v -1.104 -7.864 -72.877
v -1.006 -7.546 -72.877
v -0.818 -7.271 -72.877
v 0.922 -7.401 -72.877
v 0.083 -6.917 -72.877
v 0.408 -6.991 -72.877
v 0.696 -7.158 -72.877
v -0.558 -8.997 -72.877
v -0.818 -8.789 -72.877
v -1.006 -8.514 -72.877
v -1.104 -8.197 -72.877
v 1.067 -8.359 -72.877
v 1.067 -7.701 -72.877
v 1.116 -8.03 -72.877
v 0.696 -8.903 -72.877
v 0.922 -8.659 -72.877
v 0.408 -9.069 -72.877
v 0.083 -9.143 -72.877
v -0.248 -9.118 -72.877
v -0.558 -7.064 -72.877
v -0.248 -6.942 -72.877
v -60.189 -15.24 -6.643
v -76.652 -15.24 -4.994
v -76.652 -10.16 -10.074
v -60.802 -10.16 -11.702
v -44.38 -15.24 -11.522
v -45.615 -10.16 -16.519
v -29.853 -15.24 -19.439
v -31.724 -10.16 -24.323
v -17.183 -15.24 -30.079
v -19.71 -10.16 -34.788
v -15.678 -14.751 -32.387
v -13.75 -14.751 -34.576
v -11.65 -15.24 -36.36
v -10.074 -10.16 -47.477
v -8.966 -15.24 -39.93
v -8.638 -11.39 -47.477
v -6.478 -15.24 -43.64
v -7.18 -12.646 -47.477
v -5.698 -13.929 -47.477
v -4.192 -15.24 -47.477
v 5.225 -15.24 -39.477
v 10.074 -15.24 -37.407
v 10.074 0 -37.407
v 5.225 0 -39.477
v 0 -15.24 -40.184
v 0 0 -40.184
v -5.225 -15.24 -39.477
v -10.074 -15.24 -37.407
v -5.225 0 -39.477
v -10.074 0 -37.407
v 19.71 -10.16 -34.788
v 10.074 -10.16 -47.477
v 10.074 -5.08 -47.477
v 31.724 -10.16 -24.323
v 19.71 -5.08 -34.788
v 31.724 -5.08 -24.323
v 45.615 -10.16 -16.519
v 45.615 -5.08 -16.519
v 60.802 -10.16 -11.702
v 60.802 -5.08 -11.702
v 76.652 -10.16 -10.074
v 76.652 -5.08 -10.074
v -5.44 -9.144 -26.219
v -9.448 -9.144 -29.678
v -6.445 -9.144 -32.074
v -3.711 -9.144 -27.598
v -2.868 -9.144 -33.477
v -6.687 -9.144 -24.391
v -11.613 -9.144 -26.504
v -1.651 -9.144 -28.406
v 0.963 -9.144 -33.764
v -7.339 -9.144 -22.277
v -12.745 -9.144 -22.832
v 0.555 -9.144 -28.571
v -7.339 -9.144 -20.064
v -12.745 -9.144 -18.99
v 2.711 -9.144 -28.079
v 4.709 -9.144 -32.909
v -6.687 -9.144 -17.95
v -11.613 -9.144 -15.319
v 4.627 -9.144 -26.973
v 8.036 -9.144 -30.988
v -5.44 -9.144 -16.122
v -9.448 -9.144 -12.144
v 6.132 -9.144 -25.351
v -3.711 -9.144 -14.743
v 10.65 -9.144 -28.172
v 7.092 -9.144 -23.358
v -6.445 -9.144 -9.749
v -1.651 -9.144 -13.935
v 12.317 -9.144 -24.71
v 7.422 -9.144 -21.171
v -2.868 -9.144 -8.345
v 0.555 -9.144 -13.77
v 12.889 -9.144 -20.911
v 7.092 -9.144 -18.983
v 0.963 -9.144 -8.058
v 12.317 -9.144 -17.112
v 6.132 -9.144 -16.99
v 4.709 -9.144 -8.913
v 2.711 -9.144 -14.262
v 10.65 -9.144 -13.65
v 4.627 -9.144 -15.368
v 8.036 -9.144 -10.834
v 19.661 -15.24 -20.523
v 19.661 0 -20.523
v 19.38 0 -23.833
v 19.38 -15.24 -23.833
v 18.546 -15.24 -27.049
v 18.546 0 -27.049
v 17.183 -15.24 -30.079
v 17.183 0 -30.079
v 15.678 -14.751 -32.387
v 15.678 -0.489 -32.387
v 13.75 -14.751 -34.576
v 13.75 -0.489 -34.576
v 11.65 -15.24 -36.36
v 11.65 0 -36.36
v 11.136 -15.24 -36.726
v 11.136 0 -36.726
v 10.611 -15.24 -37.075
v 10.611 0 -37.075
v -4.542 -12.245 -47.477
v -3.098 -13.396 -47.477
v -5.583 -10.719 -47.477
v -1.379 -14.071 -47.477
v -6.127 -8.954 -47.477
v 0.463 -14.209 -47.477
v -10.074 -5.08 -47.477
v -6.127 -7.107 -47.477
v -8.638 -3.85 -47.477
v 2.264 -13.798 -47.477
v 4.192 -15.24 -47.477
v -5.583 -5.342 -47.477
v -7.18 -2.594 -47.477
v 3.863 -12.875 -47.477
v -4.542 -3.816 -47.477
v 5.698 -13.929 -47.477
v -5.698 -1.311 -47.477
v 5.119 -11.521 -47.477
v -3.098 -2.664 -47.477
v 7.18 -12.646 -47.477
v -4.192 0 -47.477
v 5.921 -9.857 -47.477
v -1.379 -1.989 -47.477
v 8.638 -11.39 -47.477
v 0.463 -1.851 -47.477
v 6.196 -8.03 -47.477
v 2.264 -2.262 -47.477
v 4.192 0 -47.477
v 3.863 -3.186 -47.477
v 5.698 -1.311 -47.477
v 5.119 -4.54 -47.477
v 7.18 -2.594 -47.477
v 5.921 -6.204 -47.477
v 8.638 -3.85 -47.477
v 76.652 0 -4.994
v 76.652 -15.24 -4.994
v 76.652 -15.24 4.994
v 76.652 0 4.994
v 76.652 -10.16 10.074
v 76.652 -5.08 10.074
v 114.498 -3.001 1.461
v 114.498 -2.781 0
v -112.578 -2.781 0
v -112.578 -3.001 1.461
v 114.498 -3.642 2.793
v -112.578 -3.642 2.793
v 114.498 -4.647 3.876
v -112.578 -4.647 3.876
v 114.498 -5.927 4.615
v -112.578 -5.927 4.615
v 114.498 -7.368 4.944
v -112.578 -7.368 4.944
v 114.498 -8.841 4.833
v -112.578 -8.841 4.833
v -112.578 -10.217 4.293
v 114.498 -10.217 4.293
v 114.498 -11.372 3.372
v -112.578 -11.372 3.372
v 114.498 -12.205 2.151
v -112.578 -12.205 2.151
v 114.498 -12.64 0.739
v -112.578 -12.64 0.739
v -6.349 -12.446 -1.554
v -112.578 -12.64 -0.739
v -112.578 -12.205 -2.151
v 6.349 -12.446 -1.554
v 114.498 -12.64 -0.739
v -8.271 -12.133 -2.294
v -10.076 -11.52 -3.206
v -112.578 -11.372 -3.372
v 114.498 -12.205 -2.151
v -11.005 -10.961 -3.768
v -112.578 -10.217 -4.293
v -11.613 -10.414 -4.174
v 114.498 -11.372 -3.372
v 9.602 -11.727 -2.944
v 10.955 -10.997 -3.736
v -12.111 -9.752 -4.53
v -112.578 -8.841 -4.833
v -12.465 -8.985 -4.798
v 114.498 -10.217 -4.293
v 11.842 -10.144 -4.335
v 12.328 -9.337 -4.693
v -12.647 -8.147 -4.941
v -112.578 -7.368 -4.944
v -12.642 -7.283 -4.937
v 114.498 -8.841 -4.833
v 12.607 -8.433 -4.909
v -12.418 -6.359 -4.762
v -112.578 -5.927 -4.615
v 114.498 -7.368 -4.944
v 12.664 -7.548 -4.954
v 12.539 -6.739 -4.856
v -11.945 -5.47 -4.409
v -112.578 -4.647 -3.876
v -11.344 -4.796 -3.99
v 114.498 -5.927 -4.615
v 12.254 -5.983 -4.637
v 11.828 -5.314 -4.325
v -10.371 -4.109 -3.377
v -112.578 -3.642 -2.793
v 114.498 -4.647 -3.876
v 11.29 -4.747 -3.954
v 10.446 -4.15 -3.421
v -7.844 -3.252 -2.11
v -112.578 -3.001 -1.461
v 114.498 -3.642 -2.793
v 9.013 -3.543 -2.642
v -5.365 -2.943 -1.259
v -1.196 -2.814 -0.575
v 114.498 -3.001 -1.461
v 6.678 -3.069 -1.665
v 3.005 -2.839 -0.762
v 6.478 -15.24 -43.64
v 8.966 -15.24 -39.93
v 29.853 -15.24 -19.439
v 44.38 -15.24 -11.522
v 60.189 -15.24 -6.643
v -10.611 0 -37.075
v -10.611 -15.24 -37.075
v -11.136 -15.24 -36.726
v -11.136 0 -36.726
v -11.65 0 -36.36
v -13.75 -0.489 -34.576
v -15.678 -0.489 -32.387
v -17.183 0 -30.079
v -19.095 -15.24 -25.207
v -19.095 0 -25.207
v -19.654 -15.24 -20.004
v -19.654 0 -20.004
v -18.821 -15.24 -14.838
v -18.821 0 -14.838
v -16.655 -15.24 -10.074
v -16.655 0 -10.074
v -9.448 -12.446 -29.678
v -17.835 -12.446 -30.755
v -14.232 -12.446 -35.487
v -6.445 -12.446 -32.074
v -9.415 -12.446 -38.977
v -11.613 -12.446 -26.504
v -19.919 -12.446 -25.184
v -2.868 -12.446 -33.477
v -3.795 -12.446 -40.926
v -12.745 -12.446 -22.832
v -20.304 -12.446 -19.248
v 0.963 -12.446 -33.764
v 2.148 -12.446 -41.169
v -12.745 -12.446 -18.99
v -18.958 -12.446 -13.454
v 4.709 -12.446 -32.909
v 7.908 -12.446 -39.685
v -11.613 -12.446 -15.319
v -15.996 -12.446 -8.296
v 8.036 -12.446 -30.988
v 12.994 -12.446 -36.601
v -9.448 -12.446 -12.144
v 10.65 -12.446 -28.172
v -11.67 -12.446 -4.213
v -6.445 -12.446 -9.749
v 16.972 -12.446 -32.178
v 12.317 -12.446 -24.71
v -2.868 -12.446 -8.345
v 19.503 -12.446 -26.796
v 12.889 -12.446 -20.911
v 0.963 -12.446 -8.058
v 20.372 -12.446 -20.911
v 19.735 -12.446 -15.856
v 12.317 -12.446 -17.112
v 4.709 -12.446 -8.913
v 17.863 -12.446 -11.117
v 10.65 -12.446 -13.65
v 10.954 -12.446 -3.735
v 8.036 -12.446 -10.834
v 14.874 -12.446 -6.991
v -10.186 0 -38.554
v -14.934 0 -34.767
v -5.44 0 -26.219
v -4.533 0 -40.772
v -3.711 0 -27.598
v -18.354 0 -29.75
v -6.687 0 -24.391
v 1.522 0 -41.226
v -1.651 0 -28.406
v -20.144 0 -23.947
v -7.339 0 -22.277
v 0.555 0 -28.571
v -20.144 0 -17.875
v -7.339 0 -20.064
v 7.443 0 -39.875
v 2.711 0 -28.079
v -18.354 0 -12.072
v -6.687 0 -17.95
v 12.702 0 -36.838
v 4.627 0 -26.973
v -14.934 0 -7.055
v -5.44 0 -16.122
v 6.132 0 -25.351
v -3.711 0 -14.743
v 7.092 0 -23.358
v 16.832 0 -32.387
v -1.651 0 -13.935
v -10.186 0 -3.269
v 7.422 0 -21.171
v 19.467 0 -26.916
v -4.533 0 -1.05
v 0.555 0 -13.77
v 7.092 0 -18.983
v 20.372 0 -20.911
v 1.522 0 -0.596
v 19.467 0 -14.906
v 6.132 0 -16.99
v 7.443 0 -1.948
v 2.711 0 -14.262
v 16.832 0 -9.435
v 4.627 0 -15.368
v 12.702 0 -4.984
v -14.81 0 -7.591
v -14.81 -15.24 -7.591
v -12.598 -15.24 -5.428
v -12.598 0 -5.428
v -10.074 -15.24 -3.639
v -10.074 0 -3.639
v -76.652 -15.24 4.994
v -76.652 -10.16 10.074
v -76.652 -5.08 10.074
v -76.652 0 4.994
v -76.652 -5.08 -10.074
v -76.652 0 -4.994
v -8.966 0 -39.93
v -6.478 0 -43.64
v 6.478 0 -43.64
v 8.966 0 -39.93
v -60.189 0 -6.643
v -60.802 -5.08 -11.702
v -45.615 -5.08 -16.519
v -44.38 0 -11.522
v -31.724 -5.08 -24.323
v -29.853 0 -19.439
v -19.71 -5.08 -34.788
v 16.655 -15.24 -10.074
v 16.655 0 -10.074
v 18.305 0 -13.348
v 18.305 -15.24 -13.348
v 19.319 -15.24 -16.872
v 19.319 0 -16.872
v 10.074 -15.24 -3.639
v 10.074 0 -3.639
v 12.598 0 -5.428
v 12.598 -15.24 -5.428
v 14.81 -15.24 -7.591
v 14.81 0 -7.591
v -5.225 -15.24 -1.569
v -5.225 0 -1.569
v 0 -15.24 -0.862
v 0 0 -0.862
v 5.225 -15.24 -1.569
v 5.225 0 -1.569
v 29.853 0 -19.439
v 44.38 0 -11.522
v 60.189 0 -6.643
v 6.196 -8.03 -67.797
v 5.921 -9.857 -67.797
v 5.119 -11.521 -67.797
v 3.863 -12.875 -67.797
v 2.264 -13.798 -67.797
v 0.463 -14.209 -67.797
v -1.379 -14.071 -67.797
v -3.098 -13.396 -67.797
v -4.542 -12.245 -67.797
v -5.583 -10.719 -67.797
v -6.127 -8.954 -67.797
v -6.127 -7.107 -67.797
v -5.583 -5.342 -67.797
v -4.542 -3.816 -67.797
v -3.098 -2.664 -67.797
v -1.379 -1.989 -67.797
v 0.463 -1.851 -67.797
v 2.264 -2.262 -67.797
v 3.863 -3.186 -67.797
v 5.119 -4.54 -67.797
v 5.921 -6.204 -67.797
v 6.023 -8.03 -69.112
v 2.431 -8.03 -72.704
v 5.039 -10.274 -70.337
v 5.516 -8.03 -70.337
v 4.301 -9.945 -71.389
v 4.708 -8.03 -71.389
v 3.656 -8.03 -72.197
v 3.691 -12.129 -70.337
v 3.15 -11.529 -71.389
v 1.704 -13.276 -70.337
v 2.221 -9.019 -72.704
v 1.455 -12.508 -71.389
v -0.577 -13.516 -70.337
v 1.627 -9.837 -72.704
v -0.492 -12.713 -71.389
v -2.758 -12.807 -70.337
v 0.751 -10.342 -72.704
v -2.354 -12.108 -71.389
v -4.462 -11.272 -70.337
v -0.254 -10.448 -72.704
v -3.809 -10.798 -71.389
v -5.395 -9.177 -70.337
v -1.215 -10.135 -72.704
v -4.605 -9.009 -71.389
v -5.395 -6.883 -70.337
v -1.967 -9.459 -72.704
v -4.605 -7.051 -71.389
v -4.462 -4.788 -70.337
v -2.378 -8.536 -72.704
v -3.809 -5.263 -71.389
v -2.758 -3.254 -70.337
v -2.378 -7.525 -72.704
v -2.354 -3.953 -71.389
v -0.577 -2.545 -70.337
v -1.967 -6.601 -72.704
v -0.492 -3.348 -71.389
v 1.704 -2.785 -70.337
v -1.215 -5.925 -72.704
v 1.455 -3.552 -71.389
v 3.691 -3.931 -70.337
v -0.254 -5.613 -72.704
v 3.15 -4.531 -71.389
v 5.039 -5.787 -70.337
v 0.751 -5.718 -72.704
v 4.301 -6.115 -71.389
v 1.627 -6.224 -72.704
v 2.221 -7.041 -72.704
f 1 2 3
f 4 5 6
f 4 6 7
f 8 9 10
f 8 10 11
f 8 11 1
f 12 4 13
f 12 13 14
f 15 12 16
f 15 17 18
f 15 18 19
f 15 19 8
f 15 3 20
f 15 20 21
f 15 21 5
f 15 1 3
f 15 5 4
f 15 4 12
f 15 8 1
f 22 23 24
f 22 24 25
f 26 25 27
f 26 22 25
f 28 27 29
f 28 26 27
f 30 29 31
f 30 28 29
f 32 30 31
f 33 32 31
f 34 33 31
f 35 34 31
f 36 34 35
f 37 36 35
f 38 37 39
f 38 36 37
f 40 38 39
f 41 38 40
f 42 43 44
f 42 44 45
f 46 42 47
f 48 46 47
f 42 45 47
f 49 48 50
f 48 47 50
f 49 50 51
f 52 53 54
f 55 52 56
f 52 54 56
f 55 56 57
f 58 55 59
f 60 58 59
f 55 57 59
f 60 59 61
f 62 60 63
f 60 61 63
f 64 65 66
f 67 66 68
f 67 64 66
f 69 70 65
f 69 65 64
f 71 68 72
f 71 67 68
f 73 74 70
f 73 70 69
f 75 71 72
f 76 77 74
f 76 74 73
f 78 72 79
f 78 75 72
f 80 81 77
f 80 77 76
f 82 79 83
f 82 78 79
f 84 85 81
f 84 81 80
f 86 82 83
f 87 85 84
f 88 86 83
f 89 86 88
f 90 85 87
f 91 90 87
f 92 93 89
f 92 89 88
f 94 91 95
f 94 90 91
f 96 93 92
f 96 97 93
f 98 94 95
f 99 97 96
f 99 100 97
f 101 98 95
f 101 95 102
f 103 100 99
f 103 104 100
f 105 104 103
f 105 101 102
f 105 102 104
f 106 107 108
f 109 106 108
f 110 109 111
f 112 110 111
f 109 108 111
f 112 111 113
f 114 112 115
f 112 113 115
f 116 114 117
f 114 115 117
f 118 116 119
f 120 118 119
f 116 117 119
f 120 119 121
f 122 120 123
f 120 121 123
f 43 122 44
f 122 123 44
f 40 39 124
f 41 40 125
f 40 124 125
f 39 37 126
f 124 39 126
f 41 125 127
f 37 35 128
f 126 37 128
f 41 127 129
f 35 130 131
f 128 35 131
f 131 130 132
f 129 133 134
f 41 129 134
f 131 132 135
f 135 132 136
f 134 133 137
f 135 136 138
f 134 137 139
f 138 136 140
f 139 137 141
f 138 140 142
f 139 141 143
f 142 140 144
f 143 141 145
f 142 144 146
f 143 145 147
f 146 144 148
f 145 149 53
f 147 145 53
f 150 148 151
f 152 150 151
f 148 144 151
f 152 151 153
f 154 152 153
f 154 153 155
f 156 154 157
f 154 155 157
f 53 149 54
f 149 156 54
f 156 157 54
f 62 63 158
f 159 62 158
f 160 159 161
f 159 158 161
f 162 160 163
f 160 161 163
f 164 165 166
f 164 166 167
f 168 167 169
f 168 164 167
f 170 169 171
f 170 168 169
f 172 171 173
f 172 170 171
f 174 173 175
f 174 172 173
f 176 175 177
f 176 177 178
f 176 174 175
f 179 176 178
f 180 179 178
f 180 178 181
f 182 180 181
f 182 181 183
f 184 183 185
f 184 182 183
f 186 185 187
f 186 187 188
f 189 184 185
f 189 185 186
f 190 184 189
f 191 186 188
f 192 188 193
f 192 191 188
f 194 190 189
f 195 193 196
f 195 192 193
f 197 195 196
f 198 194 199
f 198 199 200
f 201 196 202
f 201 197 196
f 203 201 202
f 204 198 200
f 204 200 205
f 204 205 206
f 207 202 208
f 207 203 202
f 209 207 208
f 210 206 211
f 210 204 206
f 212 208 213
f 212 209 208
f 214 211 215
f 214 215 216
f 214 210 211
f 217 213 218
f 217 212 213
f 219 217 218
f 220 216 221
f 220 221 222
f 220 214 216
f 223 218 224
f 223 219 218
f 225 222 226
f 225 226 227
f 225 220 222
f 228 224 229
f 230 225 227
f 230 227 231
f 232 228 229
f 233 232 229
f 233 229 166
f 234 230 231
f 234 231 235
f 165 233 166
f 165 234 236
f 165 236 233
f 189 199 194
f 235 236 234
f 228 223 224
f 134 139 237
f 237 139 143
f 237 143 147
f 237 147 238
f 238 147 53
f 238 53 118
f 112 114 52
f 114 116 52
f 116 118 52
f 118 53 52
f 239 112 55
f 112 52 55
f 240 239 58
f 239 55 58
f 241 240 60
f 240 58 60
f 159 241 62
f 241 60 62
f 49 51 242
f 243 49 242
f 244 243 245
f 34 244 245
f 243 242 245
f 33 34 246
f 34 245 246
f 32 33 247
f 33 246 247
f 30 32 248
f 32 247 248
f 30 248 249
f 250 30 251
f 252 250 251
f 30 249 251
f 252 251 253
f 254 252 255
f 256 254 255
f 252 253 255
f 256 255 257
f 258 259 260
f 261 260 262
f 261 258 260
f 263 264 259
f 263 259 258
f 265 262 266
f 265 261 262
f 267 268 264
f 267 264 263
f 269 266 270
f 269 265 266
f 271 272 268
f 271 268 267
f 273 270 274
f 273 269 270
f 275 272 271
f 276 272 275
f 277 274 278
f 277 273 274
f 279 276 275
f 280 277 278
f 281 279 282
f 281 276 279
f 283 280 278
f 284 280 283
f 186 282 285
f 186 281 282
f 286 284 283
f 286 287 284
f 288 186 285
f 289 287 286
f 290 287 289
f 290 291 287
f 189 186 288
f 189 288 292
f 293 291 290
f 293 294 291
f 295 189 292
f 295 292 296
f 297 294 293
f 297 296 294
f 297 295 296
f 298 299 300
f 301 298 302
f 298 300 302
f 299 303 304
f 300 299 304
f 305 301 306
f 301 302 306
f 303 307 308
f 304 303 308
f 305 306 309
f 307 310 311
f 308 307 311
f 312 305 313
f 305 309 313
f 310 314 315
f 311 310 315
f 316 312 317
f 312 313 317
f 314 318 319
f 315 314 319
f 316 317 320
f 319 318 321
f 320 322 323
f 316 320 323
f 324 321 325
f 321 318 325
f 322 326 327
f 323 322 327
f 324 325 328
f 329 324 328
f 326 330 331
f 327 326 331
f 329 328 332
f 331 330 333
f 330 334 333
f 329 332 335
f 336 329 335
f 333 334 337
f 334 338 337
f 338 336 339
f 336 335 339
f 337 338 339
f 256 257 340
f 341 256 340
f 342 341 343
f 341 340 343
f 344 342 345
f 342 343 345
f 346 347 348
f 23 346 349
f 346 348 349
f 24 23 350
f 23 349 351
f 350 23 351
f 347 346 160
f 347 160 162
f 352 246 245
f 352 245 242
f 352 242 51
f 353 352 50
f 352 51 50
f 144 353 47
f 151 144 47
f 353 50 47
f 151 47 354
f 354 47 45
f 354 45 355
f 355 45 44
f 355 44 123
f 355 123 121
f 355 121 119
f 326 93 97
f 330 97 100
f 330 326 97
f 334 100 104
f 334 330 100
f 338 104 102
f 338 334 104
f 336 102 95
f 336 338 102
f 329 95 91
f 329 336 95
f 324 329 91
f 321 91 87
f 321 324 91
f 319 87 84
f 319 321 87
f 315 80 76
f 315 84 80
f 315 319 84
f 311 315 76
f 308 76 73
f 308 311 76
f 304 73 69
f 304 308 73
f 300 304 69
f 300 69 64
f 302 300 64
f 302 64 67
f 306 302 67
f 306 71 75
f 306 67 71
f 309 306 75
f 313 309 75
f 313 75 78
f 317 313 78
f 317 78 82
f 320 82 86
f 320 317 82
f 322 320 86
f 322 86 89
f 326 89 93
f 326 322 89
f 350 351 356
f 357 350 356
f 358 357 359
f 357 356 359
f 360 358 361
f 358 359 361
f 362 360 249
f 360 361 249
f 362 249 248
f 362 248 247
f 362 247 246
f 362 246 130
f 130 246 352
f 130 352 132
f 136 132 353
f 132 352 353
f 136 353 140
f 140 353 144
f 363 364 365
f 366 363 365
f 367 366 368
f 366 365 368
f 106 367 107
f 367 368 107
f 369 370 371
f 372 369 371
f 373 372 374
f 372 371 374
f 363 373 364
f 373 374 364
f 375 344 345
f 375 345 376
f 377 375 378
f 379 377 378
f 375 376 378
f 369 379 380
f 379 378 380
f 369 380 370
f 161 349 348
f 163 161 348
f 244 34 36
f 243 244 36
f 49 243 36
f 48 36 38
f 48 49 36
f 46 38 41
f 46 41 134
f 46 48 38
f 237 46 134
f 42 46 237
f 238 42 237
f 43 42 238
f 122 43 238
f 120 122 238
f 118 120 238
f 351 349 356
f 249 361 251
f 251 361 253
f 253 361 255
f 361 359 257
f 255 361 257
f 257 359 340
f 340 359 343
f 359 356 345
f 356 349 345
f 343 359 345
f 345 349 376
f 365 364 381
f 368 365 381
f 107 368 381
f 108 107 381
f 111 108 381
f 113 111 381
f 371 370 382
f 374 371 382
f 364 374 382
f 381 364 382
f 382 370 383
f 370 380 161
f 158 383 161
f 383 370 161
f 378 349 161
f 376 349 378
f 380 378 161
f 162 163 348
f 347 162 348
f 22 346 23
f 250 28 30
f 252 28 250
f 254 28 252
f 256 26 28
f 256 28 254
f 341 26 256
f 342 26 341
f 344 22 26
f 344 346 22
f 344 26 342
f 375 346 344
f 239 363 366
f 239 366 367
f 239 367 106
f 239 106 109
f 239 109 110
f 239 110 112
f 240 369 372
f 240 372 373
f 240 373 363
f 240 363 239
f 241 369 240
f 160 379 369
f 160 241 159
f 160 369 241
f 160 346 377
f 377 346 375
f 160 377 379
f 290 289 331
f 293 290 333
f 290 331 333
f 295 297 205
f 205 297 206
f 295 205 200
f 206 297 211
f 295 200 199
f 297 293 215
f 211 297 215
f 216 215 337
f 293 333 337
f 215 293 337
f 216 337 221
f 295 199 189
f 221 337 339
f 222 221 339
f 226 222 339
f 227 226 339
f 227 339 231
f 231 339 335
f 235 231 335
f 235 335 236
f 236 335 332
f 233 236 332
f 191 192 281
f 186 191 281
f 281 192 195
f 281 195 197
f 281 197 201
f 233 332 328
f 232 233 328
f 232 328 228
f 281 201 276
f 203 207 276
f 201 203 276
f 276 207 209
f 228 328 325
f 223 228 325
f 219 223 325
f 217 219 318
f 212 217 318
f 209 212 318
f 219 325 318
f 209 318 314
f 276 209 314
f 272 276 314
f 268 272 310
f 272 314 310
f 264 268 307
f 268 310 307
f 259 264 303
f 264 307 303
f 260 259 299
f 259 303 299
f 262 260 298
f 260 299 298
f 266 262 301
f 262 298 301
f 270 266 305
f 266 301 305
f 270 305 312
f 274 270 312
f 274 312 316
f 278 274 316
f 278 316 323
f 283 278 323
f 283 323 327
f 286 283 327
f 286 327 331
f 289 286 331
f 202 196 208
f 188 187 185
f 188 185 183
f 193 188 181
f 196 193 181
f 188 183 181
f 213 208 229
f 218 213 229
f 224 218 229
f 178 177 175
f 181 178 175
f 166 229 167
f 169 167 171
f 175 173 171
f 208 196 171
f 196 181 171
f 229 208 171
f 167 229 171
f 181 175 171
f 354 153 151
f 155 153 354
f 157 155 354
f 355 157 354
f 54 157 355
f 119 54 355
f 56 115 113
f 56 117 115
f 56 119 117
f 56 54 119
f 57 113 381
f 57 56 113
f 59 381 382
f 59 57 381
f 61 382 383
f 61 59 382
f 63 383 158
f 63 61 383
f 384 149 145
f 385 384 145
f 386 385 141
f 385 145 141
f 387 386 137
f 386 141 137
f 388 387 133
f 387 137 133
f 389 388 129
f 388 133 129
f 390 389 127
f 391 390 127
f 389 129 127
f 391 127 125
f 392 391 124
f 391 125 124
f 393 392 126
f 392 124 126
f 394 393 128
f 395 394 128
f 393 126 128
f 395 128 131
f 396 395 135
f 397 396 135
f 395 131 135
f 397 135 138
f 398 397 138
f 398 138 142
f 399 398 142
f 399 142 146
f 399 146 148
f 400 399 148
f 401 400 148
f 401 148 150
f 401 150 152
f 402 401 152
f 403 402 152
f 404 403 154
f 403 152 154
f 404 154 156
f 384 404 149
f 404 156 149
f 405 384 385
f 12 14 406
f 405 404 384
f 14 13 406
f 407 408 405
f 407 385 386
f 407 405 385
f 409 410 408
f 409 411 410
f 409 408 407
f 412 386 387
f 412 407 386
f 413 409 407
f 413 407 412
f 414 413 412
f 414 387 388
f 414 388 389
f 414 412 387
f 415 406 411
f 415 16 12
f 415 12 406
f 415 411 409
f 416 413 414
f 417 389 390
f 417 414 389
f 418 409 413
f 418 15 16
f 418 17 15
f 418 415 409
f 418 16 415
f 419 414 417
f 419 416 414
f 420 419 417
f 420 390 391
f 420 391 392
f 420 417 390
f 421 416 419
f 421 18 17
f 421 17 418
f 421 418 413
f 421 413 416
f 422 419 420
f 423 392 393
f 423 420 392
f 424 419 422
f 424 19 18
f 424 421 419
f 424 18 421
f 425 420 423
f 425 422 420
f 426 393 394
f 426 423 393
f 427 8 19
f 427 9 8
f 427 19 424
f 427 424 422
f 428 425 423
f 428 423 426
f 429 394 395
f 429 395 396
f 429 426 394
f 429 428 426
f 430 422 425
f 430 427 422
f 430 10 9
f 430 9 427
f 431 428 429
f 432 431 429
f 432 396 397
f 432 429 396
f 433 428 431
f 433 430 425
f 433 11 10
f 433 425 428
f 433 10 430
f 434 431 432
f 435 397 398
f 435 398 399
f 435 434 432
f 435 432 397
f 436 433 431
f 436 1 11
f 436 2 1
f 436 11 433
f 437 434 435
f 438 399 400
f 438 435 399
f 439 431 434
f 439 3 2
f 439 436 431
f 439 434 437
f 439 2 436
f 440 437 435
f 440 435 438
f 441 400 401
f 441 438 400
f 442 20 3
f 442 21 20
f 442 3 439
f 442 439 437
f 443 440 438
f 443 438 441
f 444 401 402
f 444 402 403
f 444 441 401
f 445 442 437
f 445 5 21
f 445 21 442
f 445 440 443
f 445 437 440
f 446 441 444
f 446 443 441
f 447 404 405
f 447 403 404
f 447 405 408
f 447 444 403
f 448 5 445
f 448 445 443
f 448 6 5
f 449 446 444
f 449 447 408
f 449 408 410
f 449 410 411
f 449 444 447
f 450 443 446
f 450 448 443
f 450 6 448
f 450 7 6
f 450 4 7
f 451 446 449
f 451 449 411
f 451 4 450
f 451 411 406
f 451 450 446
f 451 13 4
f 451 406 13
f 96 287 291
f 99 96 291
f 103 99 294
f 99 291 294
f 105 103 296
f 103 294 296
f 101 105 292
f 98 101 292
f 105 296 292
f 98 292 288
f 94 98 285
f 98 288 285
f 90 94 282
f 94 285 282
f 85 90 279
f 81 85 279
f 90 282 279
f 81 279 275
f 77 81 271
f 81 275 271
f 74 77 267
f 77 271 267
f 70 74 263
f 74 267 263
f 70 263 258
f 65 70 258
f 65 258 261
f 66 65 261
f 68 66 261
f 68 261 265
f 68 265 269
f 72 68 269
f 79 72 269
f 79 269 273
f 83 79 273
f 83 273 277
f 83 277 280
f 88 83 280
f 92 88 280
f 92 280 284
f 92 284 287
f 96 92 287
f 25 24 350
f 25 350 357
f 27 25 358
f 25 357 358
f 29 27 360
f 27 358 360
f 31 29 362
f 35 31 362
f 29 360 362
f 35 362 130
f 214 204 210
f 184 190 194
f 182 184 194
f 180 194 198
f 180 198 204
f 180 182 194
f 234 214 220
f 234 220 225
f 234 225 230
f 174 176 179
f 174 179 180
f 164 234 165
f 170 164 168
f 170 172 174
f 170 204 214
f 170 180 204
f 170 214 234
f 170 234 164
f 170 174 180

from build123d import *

# Parameters (mm, degrees)
F1_DEPTH      = 15.24
F2_R          = 6.1961301732
F3_DEPTH      = 25.4
F4_R          = 5.08
F5_R          = 4.9576785655
F6_DEPTH      = 37.846
F6_DEPTH_BACK = 189.23
F7_R          = 20.3717092778
F8_DEPTH      = 12.446
F9_R          = 12.889258446
F10_DEPTH     = 7.874
F11_R         = 13.1511811708
F12_DEPTH     = 5.08
F14_R         = 14.9583115279
F13_R         = 7.4216902204
F15_DEPTH     = 9.144
F16_DEPTH     = 47.752
F17_T1_DEPTH  = 179.4321309735
F17_T6_ANGLE  = 77.8608670263
F17_T11_ANGLE = 77.8608670263
F17_T16_ANGLE = 77.8608670263
F17_T21_ANGLE = 77.8608670263


# Not quite as in the source:
# - a fillet or chamfer that OpenCascade refuses, or shapes differently, is made with other operations: its cross-section is extruded or revolved along the edge and cut away or added


with BuildPart() as f1:
    # F0 (on Front) → F1 (new body)
    with BuildSketch(Plane.XZ):
        with BuildLine():
            Line((-76.6519159079, 10.0742522627), (-76.6519159079, -10.0742522627))
            Line((-76.6519159079, -10.0742522627), (-16.654799417, -10.0742522627))
            ThreePointArc((-16.654799417, -10.0742522627), (-13.7464055669, -6.4661247251), (-10.0742522627, -3.6390008817))
            Line((-10.0742522627, -3.6390008817), (-10.0742522627, 10.0742522627))
            Line((-10.0742522627, 10.0742522627), (-76.6519159079, 10.0742522627))
        make_face()
        with BuildLine():
            Line((-16.654799417, -10.0742522627), (-76.6519159079, -10.0742522627))
            ThreePointArc((-76.6519159079, -10.0742522627), (-38.4695929071, -20.0651922972), (-10.0742522627, -47.4771112778))
            Line((-10.0742522627, -47.4771112778), (-10.0742522627, -37.4067952444))
            ThreePointArc((-10.0742522627, -37.4067952444), (-19.1148509643, -25.124964479), (-16.654799417, -10.0742522627))
        make_face()
        with BuildLine():
            Line((10.0742522627, 10.0742522627), (10.0742522627, -3.6390008817))
            ThreePointArc((10.0742522627, -3.6390008817), (13.7464055669, -6.4661247251), (16.654799417, -10.0742522627))
            Line((16.654799417, -10.0742522627), (76.6519159079, -10.0742522627))
            Line((76.6519159079, -10.0742522627), (76.6519159079, 10.0742522627))
            Line((76.6519159079, 10.0742522627), (10.0742522627, 10.0742522627))
        make_face()
        with BuildLine():
            Line((10.0742522627, -37.4067952444), (10.0742522627, -47.4771112778))
            ThreePointArc((10.0742522627, -47.4771112778), (38.4695929071, -20.0651922972), (76.6519159079, -10.0742522627))
            Line((76.6519159079, -10.0742522627), (16.654799417, -10.0742522627))
            ThreePointArc((16.654799417, -10.0742522627), (18.8945394345, -15.0866381133), (19.6610412411, -20.5228980631))
            ThreePointArc((19.6610412411, -20.5228980631), (17.0971756716, -30.230787985), (10.0742522627, -37.4067952444))
        make_face()
        with BuildLine():
            Line((-10.0742522627, 10.0742522627), (-10.0742522627, -3.6390008817))
            ThreePointArc((-10.0742522627, -3.6390008817), (0, -0.861856822), (10.0742522627, -3.6390008817))
            Line((10.0742522627, -3.6390008817), (10.0742522627, 10.0742522627))
            Line((10.0742522627, 10.0742522627), (-10.0742522627, 10.0742522627))
        make_face()
        with BuildLine():
            Line((-10.0742522627, -37.4067952444), (-10.0742522627, -47.4771112778))
            Line((-10.0742522627, -47.4771112778), (10.0742522627, -47.4771112778))
            Line((10.0742522627, -47.4771112778), (10.0742522627, -37.4067952444))
            ThreePointArc((10.0742522627, -37.4067952444), (0, -40.1839393041), (-10.0742522627, -37.4067952444))
        make_face()
    extrude(amount=F1_DEPTH)

    # F2 (on face) → F3 (join)
    with BuildSketch(Plane(origin=(0, 0, -47.4771112778), x_dir=(1, 0, 0), z_dir=(0, 0, -1))):
        with Locations((0, 8.0302003771)):
            Circle(F2_R)
    extrude(amount=F3_DEPTH)

    # F4
    f4_edges = [f1.edges().sort_by_distance(p)[0] for p in [
        (-6.19613, -8.0302, -72.877111),
    ]]
    fillet(f4_edges, radius=F4_R)

    # F17: chamfer of 5.08 on 6 edges, made by hand

    # F17_s2 → F17_t1 (cut)
    with BuildSketch(Plane.YZ.offset(-89.7160654867)):
        Polygon((-15.24, 4.9942522627), (-10.16, 10.0742522627), (-15.24, 10.0742522627), align=None)
        Polygon((0, 4.9942522627), (-5.08, 10.0742522627), (0, 10.0742522627), align=None)
    extrude(amount=F17_T1_DEPTH, mode=Mode.SUBTRACT)


with BuildPart() as f6:
    # F5 (on face) → F6 (new body, two sides)
    with BuildSketch(Plane.YZ.offset(76.6519159079)) as f6_sk:
        with Locations((-7.7381939627, 0)):
            Circle(F5_R)
    extrude(amount=F6_DEPTH)
    extrude(f6_sk.sketch, amount=-F6_DEPTH_BACK)

    # F7 (on Front) → F8 (join)
    with BuildSketch(Plane.XZ):
        with Locations((0, -20.9111645818)):
            Circle(F7_R)
    extrude(amount=F8_DEPTH)

    # F9 (on face) → F10 (cut)
    with BuildSketch(Plane.XZ.offset(12.446)):
        with Locations((0, -20.9111645818)):
            Circle(F9_R)
    extrude(amount=-F10_DEPTH, mode=Mode.SUBTRACT)

    # F11 (on face) → F12 (cut)
    with BuildSketch(Plane(origin=(0, 0, 0), x_dir=(-1, 0, 0), z_dir=(0, 1, 0))):
        with Locations((0, -20.9111645818)):
            Circle(F11_R)
    extrude(amount=-F12_DEPTH, mode=Mode.SUBTRACT)

    # F14 (on face) + F13 (on Front) → F15 (join)
    with BuildSketch(Plane.XZ):
        with Locations((0, -20.5865148455)):
            Circle(F14_R)
    with BuildSketch(Plane.XZ):
        with Locations((0, -21.1705304682)):
            Circle(F13_R)
    extrude(amount=F15_DEPTH)

    # F13 (on Front) → F16 (cut)
    with BuildSketch(Plane.XZ):
        with Locations((0, -21.1705304682)):
            Circle(F13_R)
    extrude(amount=F16_DEPTH, mode=Mode.SUBTRACT)


with BuildPart() as f17_tool4:
    # F17_s5 → F17_t6 (revolve)
    with BuildSketch(Plane(origin=(-88.9987069649, 0, -15.0585411126), x_dir=(0, 1, 0), z_dir=(-0.9859859493, 0, -0.1668283783))):
        Polygon((-10.16, -3.9471238438), (-15.24, -9.0271238438), (-15.24, -3.9471238438), align=None)
    revolve(axis=Axis((-76.6519159079, -15.24, -88.0303138114), (0, 1, 0)), revolution_arc=F17_T6_ANGLE)

    split(bisect_by=Plane.XY.offset(-47.4771112778), keep=Keep.TOP)


with BuildPart() as f1_1:
    add(f1.part)

    # F17_t3: cut F17_tool4
    add(f17_tool4.part, mode=Mode.SUBTRACT)


with BuildPart() as f17_tool9:
    # F17_s10 → F17_t11 (revolve)
    with BuildSketch(Plane(origin=(-19.7713095684, 0, -49.575786093), x_dir=(0, 1, 0), z_dir=(-0.3704374447, 0, -0.9288574162))):
        Polygon((-15.24, 20.7723635106), (-10.16, 25.8523635106), (-15.24, 25.8523635106), align=None)
    revolve(axis=Axis((76.6519159079, -15.24, -88.0303138114), (0, 1, 0)), revolution_arc=F17_T11_ANGLE)

    split(bisect_by=Plane.XY.offset(-47.4771112778), keep=Keep.TOP)


with BuildPart() as f1_2:
    add(f1_1.part)

    # F17_t8: cut F17_tool9
    add(f17_tool9.part, mode=Mode.SUBTRACT)


with BuildPart() as f17_tool14:
    # F17_s15 → F17_t16 (revolve)
    with BuildSketch(Plane(origin=(-19.7713095684, 0, -49.575786093), x_dir=(0, 1, 0), z_dir=(-0.3704374447, 0, -0.9288574162))):
        Polygon((0, 20.7723635106), (-5.08, 25.8523635106), (0, 25.8523635106), align=None)
    revolve(axis=Axis((76.6519159079, 0, -88.0303138114), (0, 1, 0)), revolution_arc=F17_T16_ANGLE)

    split(bisect_by=Plane.XY.offset(-47.4771112778), keep=Keep.TOP)


with BuildPart() as f1_3:
    add(f1_2.part)

    # F17_t13: cut F17_tool14
    add(f17_tool14.part, mode=Mode.SUBTRACT)


with BuildPart() as f17_tool19:
    # F17_s20 → F17_t21 (revolve)
    with BuildSketch(Plane(origin=(-88.9987069649, 0, -15.0585411126), x_dir=(0, 1, 0), z_dir=(-0.9859859493, 0, -0.1668283783))):
        Polygon((-5.08, -3.9471238438), (0, -9.0271238438), (0, -3.9471238438), align=None)
    revolve(axis=Axis((-76.6519159079, 0, -88.0303138114), (0, 1, 0)), revolution_arc=F17_T21_ANGLE)

    split(bisect_by=Plane.XY.offset(-47.4771112778), keep=Keep.TOP)


with BuildPart() as f1_4:
    add(f1_3.part)

    # F17_t18: cut F17_tool19
    add(f17_tool19.part, mode=Mode.SUBTRACT)


solid = Compound([f6.part, f1_4.part])
